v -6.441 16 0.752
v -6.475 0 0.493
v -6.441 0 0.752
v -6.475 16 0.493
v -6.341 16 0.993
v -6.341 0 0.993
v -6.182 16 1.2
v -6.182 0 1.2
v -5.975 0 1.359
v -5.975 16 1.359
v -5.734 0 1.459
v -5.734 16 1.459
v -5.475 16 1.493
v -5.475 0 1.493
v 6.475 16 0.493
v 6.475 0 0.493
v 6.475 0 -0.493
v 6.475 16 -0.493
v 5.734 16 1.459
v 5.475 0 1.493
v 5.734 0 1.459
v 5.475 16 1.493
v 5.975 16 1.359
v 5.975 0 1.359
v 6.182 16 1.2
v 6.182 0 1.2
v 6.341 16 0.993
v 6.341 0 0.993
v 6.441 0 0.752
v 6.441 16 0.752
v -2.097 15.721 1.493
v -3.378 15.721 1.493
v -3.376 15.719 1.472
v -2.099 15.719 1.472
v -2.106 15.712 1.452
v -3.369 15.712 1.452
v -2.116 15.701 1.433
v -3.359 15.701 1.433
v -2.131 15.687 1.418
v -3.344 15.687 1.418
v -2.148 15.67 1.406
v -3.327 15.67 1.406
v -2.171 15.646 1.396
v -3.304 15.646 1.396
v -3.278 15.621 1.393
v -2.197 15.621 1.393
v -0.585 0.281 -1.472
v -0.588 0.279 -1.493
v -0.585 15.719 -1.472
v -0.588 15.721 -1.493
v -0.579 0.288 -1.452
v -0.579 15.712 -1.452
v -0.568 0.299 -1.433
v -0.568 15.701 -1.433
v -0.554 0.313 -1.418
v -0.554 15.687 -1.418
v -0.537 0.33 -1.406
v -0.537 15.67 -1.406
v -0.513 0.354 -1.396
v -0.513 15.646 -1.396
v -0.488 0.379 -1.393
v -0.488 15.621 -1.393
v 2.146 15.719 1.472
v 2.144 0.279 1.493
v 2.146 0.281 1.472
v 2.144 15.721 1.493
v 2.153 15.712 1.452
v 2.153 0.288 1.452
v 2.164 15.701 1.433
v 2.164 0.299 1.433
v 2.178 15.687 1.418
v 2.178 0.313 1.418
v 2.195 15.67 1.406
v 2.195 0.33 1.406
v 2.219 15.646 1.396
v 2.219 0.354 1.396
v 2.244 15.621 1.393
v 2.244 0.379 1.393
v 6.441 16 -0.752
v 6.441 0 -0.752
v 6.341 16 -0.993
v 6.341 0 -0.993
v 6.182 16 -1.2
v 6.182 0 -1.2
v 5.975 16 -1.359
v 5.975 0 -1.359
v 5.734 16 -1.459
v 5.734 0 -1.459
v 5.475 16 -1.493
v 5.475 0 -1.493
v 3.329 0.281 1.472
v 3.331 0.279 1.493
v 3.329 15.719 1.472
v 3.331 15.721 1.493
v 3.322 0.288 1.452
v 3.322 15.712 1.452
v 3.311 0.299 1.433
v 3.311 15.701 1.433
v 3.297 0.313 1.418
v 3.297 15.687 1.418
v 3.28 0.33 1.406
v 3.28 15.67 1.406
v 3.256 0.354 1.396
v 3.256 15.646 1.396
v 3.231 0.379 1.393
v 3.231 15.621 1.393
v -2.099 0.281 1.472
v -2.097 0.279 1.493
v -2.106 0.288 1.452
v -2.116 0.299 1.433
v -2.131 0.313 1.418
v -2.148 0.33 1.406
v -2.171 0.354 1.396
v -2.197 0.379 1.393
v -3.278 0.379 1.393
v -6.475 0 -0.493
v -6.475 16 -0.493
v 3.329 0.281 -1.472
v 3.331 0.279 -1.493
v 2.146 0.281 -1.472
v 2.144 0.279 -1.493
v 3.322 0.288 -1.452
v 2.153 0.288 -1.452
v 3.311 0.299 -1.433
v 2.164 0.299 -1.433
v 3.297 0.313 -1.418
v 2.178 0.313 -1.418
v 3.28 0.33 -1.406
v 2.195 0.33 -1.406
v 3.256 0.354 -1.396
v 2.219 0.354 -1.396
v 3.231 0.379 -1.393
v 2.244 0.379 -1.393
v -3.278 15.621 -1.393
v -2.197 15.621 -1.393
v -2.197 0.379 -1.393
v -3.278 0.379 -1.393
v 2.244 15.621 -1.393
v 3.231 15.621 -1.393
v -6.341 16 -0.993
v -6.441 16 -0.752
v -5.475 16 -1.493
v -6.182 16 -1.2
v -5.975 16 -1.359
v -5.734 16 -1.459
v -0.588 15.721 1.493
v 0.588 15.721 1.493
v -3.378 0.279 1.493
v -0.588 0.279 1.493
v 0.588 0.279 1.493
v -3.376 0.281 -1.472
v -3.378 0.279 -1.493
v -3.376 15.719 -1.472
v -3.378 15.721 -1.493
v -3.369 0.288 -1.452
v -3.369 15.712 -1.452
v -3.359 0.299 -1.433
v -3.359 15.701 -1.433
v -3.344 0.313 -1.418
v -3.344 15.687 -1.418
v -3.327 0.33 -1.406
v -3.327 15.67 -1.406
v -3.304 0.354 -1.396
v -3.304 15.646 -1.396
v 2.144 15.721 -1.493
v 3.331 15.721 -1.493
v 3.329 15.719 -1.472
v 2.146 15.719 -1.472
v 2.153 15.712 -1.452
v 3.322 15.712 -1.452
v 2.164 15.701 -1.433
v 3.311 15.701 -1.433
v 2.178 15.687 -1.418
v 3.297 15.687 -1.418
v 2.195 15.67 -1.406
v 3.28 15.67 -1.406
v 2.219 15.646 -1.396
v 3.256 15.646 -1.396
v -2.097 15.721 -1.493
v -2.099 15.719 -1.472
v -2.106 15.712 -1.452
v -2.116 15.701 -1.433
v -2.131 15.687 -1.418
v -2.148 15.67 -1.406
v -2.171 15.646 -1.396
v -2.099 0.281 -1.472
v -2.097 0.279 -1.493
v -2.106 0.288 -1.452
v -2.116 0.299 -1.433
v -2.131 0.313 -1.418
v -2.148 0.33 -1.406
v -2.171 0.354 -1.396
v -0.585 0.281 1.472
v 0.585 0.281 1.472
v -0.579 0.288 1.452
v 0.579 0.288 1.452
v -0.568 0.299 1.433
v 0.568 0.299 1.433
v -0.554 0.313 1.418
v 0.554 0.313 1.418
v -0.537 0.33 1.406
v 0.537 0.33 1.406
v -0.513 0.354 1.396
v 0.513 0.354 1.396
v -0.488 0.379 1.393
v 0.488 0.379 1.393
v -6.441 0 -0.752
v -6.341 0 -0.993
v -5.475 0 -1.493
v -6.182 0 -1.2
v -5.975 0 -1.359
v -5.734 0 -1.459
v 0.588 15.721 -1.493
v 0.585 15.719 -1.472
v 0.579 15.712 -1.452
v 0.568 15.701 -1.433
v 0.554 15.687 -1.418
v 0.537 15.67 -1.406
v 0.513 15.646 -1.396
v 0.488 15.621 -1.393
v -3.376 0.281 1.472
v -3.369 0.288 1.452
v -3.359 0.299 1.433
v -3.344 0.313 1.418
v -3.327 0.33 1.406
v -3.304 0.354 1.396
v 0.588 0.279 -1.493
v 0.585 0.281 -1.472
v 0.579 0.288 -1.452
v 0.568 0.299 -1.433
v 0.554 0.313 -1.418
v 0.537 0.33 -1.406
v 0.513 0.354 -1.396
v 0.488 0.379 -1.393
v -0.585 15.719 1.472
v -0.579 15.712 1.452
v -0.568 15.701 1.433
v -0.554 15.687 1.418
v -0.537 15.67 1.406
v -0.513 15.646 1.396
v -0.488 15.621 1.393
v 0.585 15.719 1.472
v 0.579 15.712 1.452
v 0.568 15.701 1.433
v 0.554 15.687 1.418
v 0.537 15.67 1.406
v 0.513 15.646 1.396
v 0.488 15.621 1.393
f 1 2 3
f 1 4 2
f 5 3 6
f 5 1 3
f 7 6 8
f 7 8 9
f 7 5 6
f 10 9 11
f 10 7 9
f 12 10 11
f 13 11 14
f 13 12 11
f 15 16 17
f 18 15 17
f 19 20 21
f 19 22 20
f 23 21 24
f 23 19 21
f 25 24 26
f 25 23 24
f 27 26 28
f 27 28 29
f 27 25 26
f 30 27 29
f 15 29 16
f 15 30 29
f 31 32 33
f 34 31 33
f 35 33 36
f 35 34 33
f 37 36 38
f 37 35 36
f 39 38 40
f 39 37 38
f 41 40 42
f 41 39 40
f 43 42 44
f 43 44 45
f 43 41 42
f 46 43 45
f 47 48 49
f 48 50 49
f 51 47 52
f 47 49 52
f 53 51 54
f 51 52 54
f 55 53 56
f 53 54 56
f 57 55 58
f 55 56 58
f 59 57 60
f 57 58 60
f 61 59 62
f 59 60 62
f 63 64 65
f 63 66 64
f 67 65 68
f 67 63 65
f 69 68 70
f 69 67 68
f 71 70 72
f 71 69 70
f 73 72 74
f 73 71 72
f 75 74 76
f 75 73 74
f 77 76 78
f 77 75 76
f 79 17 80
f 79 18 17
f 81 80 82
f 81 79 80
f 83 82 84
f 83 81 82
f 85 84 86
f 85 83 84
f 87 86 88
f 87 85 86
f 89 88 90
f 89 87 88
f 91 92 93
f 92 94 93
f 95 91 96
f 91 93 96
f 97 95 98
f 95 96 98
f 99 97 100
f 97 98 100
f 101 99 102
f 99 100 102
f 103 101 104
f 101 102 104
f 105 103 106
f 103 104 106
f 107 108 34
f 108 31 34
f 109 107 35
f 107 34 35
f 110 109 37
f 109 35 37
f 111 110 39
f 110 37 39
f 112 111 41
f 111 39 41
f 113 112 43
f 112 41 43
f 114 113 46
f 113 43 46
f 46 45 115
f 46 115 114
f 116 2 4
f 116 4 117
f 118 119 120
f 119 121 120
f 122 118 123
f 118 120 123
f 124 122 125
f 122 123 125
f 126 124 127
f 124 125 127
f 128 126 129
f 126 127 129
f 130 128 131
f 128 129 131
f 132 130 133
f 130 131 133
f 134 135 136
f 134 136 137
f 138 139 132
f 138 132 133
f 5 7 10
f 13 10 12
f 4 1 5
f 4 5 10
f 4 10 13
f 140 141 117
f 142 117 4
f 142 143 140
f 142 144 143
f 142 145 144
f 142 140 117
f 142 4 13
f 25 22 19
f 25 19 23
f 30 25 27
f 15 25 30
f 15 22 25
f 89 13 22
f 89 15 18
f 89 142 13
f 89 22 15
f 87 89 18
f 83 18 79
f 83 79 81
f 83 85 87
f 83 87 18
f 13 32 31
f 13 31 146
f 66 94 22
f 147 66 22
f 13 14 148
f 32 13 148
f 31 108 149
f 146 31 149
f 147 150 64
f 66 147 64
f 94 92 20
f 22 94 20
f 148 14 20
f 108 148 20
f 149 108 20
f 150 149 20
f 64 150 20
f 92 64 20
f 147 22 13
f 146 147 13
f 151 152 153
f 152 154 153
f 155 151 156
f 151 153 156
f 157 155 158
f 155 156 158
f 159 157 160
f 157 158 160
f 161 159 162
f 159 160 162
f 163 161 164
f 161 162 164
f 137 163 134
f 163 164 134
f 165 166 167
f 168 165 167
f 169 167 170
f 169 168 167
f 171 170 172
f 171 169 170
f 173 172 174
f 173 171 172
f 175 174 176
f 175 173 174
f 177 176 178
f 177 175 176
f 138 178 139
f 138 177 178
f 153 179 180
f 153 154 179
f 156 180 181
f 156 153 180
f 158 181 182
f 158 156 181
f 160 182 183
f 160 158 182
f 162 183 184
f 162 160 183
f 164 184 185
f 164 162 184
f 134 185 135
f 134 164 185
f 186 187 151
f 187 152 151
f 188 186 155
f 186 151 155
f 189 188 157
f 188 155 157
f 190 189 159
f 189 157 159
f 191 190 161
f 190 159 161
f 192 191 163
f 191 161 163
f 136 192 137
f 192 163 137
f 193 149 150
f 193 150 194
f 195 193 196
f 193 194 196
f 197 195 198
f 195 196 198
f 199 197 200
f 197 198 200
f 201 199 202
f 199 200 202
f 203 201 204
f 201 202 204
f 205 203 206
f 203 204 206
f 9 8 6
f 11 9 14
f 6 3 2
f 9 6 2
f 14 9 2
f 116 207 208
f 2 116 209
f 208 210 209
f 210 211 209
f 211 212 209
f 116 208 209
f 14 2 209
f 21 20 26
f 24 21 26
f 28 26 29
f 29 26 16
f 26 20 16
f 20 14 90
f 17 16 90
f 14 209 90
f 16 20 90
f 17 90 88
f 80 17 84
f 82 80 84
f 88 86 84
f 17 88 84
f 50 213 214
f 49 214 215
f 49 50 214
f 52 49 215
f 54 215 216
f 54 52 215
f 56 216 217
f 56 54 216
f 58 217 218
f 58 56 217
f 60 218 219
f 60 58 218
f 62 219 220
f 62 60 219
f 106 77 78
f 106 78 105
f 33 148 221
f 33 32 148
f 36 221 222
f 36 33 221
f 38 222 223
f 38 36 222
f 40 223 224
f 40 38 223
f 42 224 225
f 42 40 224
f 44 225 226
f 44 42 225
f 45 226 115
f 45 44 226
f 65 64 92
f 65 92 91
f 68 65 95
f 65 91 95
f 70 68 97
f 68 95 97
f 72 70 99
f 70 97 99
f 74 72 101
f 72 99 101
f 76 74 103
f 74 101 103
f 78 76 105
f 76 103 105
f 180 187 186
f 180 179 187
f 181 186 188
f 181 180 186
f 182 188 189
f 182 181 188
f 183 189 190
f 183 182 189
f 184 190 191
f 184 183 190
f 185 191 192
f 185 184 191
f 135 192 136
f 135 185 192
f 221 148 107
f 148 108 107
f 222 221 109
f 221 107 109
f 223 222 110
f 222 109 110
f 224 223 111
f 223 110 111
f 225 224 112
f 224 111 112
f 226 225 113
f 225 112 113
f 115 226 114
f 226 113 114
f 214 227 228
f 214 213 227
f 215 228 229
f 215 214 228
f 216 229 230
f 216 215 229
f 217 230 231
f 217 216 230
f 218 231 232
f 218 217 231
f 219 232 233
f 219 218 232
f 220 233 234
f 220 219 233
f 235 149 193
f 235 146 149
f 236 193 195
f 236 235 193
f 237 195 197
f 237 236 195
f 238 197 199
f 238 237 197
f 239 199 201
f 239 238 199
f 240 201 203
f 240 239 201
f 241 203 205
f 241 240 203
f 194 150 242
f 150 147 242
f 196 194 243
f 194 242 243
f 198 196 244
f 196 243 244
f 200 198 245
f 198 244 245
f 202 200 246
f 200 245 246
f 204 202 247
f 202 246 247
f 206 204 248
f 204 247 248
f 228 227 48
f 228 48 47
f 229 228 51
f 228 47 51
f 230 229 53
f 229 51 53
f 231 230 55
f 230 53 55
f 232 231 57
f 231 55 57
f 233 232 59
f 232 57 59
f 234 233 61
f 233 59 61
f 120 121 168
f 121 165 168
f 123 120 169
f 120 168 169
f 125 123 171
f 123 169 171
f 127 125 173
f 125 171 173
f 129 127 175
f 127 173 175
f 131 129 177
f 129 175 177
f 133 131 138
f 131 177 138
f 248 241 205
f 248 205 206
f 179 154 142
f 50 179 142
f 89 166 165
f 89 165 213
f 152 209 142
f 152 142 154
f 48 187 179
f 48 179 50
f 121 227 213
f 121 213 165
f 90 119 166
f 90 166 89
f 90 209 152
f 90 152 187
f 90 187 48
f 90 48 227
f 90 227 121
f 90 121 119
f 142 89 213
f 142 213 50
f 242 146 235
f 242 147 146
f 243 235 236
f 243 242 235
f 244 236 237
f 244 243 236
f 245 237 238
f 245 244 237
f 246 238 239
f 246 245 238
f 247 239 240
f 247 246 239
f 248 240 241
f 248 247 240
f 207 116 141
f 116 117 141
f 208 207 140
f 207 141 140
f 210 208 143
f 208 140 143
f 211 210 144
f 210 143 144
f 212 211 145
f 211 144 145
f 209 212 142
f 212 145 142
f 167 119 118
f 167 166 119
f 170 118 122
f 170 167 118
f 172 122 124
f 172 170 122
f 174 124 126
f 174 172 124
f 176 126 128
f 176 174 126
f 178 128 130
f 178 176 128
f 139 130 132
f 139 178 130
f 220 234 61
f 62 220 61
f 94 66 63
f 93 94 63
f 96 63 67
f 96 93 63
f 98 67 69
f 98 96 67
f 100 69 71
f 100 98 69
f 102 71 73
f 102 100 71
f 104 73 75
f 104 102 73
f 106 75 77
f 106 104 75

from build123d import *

# Parameters (mm, degrees)
SKETCH1_W           = 12.950156288
SKETCH1_H           = 2.985631362
BOSS_EXTRUDE1_DEPTH = 16
FILLET1_R           = 1
SKETCH2_W           = 10.950156288
SKETCH2_H           = 0.272417851
BOSS_EXTRUDE2_DEPTH = 0.1
FILLET2_R           = 0.1
CUT_EXTRUDE2_DEPTH  = 0.1
SKETCH6_W           = 1.186627285
SKETCH6_H           = 15.441785482
SKETCH6_W_2         = 1.175471446
SKETCH6_W_3         = 1.281551352
CUT_EXTRUDE3_DEPTH  = 0.1
SKETCH10_W          = 1.186627285
SKETCH10_H          = 15.441785482
SKETCH10_W_2        = 1.175471446
SKETCH10_W_3        = 1.281551352
CUT_EXTRUDE4_DEPTH  = 0.1
FILLET6_R           = 0.1
FILLET7_R           = 0.1


with BuildPart() as part:
    # Sketch1 → Boss-Extrude1 (new body)
    with BuildSketch(Plane(origin=(0, 0, 0), x_dir=(1, 0, 0), z_dir=(0, 1, 0))):
        Rectangle(SKETCH1_W, SKETCH1_H)
    extrude(amount=BOSS_EXTRUDE1_DEPTH)

    # Fillet1
    fillet1_edges = [part.edges().sort_by_distance(p)[0] for p in [
        (6.475078144, 8, 1.492815681),
        (-6.475078144, 8, 1.492815681),
        (-6.475078144, 8, -1.492815681),
        (6.475078144, 8, -1.492815681),
    ]]
    fillet(fillet1_edges, radius=FILLET1_R)

    # Sketch2 → Boss-Extrude2 (add)
    with BuildSketch(Plane(origin=(0, 0, -1.492815681), x_dir=(-1, 0, 0), z_dir=(0, 0, -1))):
        with Locations((0, 10.703223293)):
            Rectangle(SKETCH2_W, SKETCH2_H)
    extrude(amount=BOSS_EXTRUDE2_DEPTH)

    # Fillet2
    fillet2_edges = [part.edges().sort_by_distance(p)[0] for p in [
        (0, 10.839432218, -1.592815681),
        (-5.475078144, 10.703223292, -1.592815681),
        (0, 10.567014367, -1.592815681),
        (5.475078144, 10.703223292, -1.592815681),
    ]]
    fillet(fillet2_edges, radius=FILLET2_R - 0.0001)  # a hair under: the kernel refuses the full size

    # Sketch5 → Cut-Extrude2 (cut)
    with BuildSketch(Plane(origin=(0, 0, -1.592815681), x_dir=(-1, 0, 0), z_dir=(0, 0, -1))):
        Polygon((-5.375078144, 10.567014367), (5.475078144, 10.567014367), (5.475078144, 10.739432218), (5.475078144, 10.839432218), (-5.375078144, 10.839432218), (-5.475078144, 10.839432218), (-5.475078144, 10.567014367), align=None)
    extrude(amount=-CUT_EXTRUDE2_DEPTH, mode=Mode.SUBTRACT)

    # Sketch6 → Cut-Extrude3 (cut)
    with BuildSketch(Plane(origin=(0, 0, -1.492815681), x_dir=(-1, 0, 0), z_dir=(0, 0, -1))):
        with Locations((-2.737539072, 8)):
            Rectangle(SKETCH6_W, SKETCH6_H)
        with Locations((0, 8)):
            Rectangle(SKETCH6_W_2, SKETCH6_H)
        with Locations((2.737539072, 8)):
            Rectangle(SKETCH6_W_3, SKETCH6_H)
    extrude(amount=-CUT_EXTRUDE3_DEPTH, mode=Mode.SUBTRACT)

    # Sketch10 → Cut-Extrude4 (cut)
    with BuildSketch(Plane.XY.offset(1.492815681)):
        with Locations((2.737539072, 8)):
            Rectangle(SKETCH10_W, SKETCH10_H)
        with Locations((0, 8)):
            Rectangle(SKETCH10_W_2, SKETCH10_H)
        with Locations((-2.737539072, 8)):
            Rectangle(SKETCH10_W_3, SKETCH10_H)
    extrude(amount=-CUT_EXTRUDE4_DEPTH, mode=Mode.SUBTRACT)

    # Fillet6
    fillet6_edges = [part.edges().sort_by_distance(p)[0] for p in [
        (2.144225429, 8, 1.392815681),
        (2.737539072, 15.720892741, 1.392815681),
        (3.330852714, 8, 1.392815681),
        (2.737539072, 0.279107259, 1.392815681),
        (-0.587735723, 8, 1.392815681),
        (0, 15.720892741, 1.392815681),
        (0.587735723, 8, 1.392815681),
        (0, 0.279107259, 1.392815681),
        (-3.378314748, 8, 1.392815681),
        (-2.737539072, 15.720892741, 1.392815681),
        (-2.096763396, 8, 1.392815681),
        (-2.737539072, 0.279107259, 1.392815681),
    ]]
    fillet(fillet6_edges, radius=FILLET6_R - 0.0001)  # a hair under: the kernel refuses the full size

    # Fillet7
    fillet7_edges = [part.edges().sort_by_distance(p)[0] for p in [
        (-3.378314748, 8, -1.392815681),
        (-2.737539072, 0.279107259, -1.392815681),
        (-2.096763396, 8, -1.392815681),
        (-2.737539072, 15.720892741, -1.392815681),
        (-0.587735723, 8, -1.392815681),
        (0, 0.279107259, -1.392815681),
        (0.587735723, 8, -1.392815681),
        (0, 15.720892741, -1.392815681),
        (2.144225429, 8, -1.392815681),
        (2.737539072, 0.279107259, -1.392815681),
        (3.330852714, 8, -1.392815681),
        (2.737539072, 15.720892741, -1.392815681),
    ]]
    fillet(fillet7_edges, radius=FILLET7_R - 0.0001)  # a hair under: the kernel refuses the full size


solid = part.part
